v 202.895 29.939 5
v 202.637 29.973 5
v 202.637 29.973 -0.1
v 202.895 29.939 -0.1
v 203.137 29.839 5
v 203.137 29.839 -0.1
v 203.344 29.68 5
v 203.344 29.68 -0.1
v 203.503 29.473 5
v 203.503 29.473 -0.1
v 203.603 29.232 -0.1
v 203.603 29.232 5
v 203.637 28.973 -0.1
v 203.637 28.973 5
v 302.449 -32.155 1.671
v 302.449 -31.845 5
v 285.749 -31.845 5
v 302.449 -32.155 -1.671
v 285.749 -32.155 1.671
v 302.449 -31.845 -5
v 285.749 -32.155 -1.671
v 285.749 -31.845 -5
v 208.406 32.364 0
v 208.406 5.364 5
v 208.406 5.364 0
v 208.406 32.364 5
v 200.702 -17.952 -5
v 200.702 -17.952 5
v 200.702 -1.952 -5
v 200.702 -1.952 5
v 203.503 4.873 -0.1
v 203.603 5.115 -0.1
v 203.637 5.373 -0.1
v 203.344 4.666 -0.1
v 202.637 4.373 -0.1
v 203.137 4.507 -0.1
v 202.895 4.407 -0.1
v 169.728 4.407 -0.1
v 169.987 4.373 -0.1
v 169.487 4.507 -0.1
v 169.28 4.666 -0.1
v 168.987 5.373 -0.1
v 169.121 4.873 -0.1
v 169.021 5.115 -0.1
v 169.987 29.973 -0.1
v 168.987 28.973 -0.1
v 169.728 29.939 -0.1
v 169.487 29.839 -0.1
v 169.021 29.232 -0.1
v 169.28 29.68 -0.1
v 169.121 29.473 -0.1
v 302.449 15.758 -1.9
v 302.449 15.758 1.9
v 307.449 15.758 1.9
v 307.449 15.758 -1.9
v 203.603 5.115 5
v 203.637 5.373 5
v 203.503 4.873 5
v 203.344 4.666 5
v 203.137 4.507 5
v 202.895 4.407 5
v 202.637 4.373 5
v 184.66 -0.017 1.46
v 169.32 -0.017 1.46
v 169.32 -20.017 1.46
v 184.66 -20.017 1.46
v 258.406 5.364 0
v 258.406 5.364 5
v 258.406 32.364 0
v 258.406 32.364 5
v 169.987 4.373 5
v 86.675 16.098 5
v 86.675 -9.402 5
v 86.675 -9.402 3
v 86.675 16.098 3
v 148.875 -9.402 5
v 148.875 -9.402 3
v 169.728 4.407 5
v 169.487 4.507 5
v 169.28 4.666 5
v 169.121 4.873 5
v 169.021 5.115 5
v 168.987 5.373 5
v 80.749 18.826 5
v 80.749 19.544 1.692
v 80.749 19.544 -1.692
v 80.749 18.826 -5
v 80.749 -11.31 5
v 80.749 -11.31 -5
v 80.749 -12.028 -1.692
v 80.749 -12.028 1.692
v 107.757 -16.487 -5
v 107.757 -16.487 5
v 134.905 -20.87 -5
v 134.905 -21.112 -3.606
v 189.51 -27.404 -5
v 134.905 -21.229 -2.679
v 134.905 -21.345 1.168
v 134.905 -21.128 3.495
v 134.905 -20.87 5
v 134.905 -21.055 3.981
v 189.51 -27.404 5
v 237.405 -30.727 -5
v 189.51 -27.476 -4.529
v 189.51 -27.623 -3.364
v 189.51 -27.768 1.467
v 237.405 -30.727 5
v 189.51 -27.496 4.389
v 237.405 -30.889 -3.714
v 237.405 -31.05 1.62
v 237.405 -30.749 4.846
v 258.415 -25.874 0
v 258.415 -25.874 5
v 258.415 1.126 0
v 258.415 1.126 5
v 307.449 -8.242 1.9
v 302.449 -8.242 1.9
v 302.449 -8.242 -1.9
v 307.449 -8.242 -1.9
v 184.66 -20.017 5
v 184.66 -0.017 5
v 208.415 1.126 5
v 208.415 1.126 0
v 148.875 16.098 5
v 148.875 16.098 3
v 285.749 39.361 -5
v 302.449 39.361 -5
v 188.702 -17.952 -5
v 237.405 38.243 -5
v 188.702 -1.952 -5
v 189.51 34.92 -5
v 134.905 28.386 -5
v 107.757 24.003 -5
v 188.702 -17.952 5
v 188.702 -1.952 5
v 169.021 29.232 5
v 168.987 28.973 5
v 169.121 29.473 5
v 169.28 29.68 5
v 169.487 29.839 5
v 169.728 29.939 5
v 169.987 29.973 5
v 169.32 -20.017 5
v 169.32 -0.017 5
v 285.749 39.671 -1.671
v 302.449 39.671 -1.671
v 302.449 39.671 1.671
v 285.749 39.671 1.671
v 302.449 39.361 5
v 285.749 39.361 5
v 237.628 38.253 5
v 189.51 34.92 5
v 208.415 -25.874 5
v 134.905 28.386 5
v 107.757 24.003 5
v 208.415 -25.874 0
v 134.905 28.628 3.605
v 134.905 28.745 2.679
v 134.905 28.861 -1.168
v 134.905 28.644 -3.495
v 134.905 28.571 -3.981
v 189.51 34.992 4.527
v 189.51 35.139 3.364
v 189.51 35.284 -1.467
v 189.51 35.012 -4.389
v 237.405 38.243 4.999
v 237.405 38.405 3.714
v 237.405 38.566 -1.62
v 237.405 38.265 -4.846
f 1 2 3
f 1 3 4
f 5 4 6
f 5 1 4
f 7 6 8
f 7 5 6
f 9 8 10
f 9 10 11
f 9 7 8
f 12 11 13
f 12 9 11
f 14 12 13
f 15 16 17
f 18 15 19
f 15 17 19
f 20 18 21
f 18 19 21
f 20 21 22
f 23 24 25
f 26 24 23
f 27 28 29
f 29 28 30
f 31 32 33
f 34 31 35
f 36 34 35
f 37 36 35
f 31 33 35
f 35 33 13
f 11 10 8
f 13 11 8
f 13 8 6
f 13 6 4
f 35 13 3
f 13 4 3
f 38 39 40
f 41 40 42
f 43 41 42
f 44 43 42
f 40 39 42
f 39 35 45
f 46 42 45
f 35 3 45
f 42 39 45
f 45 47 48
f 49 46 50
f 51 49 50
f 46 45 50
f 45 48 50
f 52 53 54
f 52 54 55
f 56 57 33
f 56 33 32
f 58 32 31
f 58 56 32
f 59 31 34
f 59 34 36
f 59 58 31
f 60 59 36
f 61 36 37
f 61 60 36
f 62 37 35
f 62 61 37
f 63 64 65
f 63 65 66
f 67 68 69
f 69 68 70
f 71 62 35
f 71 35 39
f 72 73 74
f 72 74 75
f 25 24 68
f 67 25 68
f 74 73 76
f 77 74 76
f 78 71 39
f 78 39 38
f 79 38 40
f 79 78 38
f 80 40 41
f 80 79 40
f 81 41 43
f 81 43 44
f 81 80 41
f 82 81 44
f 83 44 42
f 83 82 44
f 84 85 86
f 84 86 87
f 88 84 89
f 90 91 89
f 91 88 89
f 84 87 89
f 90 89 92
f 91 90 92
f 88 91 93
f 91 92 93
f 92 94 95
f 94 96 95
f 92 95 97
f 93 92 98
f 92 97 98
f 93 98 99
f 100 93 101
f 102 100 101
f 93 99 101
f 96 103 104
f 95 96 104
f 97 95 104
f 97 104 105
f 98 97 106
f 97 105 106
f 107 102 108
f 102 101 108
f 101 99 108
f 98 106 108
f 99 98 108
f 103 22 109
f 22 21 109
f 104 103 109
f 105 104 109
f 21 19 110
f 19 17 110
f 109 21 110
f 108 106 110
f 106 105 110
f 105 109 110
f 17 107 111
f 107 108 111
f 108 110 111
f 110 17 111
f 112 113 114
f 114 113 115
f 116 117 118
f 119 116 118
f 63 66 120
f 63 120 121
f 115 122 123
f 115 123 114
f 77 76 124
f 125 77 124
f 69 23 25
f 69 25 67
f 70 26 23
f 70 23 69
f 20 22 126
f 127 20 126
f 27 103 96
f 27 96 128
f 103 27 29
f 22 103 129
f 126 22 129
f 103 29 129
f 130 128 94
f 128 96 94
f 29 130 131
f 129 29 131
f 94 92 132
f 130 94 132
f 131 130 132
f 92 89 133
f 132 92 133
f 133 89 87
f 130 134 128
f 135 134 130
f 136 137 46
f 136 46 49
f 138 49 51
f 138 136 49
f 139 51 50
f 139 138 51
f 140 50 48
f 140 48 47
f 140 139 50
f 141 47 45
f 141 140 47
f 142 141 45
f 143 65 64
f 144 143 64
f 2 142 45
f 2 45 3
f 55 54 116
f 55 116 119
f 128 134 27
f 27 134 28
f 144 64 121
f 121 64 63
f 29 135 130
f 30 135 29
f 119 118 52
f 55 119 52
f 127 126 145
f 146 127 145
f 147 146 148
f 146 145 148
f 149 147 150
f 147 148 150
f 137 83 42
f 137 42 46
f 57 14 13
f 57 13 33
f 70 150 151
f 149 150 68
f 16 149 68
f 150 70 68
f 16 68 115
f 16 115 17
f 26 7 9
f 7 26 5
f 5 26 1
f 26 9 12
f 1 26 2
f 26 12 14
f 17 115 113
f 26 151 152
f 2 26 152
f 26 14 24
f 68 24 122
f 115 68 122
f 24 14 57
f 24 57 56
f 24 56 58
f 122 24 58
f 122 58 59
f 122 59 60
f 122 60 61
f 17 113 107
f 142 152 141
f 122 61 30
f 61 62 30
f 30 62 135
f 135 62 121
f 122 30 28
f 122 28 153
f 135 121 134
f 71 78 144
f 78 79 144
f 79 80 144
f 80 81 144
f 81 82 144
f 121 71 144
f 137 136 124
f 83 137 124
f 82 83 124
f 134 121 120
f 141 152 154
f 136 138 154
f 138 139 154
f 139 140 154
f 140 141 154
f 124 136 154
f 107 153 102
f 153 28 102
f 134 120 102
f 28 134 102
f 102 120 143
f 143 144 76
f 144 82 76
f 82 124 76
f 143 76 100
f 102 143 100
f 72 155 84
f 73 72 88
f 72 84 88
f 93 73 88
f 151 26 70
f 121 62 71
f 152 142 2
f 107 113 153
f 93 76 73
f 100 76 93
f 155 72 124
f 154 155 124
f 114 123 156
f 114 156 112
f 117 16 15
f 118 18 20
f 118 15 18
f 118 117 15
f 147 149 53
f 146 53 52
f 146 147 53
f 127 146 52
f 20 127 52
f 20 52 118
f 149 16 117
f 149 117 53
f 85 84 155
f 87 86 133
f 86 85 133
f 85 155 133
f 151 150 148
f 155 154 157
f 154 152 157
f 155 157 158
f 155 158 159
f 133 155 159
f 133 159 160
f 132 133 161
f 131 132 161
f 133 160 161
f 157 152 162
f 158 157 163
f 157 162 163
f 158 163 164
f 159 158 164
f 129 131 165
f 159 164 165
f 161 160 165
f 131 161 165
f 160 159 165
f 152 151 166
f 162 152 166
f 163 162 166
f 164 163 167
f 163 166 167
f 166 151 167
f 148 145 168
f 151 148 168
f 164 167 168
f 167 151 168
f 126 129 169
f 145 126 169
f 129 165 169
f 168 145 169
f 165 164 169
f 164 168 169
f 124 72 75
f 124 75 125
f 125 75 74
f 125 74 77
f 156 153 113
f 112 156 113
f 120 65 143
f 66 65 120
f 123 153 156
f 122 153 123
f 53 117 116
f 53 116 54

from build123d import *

# Parameters (mm, degrees)
CUT_EXTRUDE1_DEPTH   = 212.88306668
BOSS_EXTRUDE2_DEPTH  = 139.7
SKETCH9_R            = 35.95202499
BOSS_EXTRUDE3_DEPTH  = 4
CUT_EXTRUDE2_DEPTH   = 4
SKETCH11_W           = 10
SKETCH11_H           = 34
CUT_EXTRUDE3_DEPTH   = 15
RASPBERRY_PI_5_DEPTH = 5
GPS_SLOT_DEPTH       = 5.1
SKETCH14_W           = 12
SKETCH14_H           = 16
MPU_DEPTH            = 434.220724454
ALTIMETER_DEPTH      = 434.220724454
ALTIMETER_DEPTH_BACK = 3.54
SKETCH15_W           = 15.34
SKETCH15_H           = 20
SKETCH16_W           = 62.2
SKETCH16_H           = 25.5
PCA9685_DEPTH        = 2
SKETCH17_W           = 50
SKETCH17_H           = 27
ESP_32_1_DEPTH       = 5
SKETCH18_W           = 55
SKETCH18_H           = 30.1
BATTERY_1_DEPTH      = 3.5
SKETCH21_W           = 55
SKETCH21_H           = 30.1
BATTERY_2_DEPTH      = 3.5
SKETCH25_W           = 21.1
SKETCH25_H           = 43.1
STEP_DOWN_DEPTH      = 1
BOSS_EXTRUDE4_START  = -120
SKETCH27_R           = 36.3
SKETCH27_R_2         = 30
BOSS_EXTRUDE4_DEPTH  = 7
CUT_EXTRUDE4_START   = -127
SKETCH28_R           = 36.3
CUT_EXTRUDE4_DEPTH   = 480.865446219
SKETCH29_W           = 3.8
SKETCH29_H           = 24
BOSS_EXTRUDE5_DEPTH  = 5
SKETCH33_W           = 50
SKETCH33_H           = 27
ESP_32_2_DEPTH       = 5


with BuildPart() as part:
    # Sketch3 → Revolve1 (revolve)
    with BuildSketch(Plane.XY):
        with BuildLine():
            Line((285.74876522, 39.710021262), (285.74876522, 3.757996272))
            Line((285.74876522, 3.757996272), (80.74876522, 3.757996272))
            Line((80.74876522, 3.757996272), (80.74876522, 19.634316044))
            add(Edge.make_bspline(
                [(80.74876522, 19.634316044), (82.347112552, 19.950400666), (85.636412123, 20.593859316), (92.311794173, 21.870421625), (109.164486257, 24.943674568), (127.867996046, 27.977765645), (146.633052135, 30.604670801), (163.733801994, 32.658467989), (174.004488004, 33.801497199), (184.284802392, 34.855212792), (194.57611333, 35.797171826), (204.876878825, 36.627240946), (213.466527777, 37.244314669), (220.34120026, 37.693162367), (227.218898943, 38.097179671), (233.238636081, 38.411453209), (238.400481516, 38.652791264), (242.701722554, 38.8352093), (246.145182192, 38.969923968), (249.584994627, 39.093417446), (253.03241088, 39.20568842), (256.467961578, 39.306735697), (259.924132141, 39.396558203), (263.346991762, 39.475154984), (266.82565511, 39.542525204), (270.211898057, 39.598668148), (273.756466178, 39.643583219), (276.60509147, 39.673059099), (279.43950326, 39.691306197), (281.597603414, 39.703938851), (283.942998009, 39.708617629), (285.03032454, 39.710021262), (285.74876522, 39.710021262)],
                knots=[0.322773044, 0.322773044, 0.322773044, 0.322773044, 0.322773044, 0.341563488, 0.3614269, 0.401153715, 0.520334158, 0.56006097, 0.579924379, 0.599787787, 0.639514601, 0.679241414, 0.699104823, 0.718968231, 0.738831638, 0.758695045, 0.778558452, 0.788490156, 0.798421859, 0.808353563, 0.818285267, 0.828216971, 0.838148675, 0.848080378, 0.858012082, 0.867943786, 0.87787549, 0.887807193, 0.897738897, 0.902704749, 0.9076706, 0.917602304, 0.917602304, 0.917602304, 0.917602304, 0.917602304], degree=4))
        make_face()
    revolve(axis=Axis((285.74876522, 3.757996272, 0), (-1, 0, 0)))

    # Sketch6 → Cut-Extrude1 (cut, through all)
    with BuildSketch(Plane(origin=(285.74876522, 0, 0), x_dir=(0, 0, -1), z_dir=(1, 0, 0))):
        with BuildLine():
            Line((-5, -31.844645496), (-5, 39.36063804))
            ThreePointArc((-5, 39.360638041), (-35.95202499, 3.757996272), (-5, -31.844645496))
        make_face()
        with BuildLine():
            ThreePointArc((35.95202499, 3.757996272), (27.132160123, 27.346001444), (5, 39.36063804))
            Line((5, 39.36063804), (5, -31.844645496))
            ThreePointArc((5, -31.844645496), (27.132160123, -19.830008899), (35.95202499, 3.757996272))
        make_face()
    extrude(amount=-CUT_EXTRUDE1_DEPTH, mode=Mode.SUBTRACT)

    # Sketch8 → Boss-Extrude2 (add)
    with BuildSketch(Plane(origin=(285.74876522, 0, 0), x_dir=(0, 0, -1), z_dir=(1, 0, 0))):
        with BuildLine():
            Line((5, -31.844645496), (5, 39.360638041))
            ThreePointArc((5, 39.360638041), (0, 39.710021262), (-5, 39.360638041))
            Line((-5, 39.360638041), (-5, -31.844645496))
            ThreePointArc((-5, -31.844645496), (0, -32.194028718), (5, -31.844645496))
        make_face()
    extrude(amount=BOSS_EXTRUDE2_DEPTH)

    # Sketch9 → Boss-Extrude3 (add)
    with BuildSketch(Plane(origin=(425.44876522, 0, 0), x_dir=(0, 0, -1), z_dir=(1, 0, 0))):
        with Locations(Location((0, 3.757996272, 0), (0, 0, 262.00572083))):
            Circle(SKETCH9_R)
    extrude(amount=BOSS_EXTRUDE3_DEPTH)

    # Sketch10 → Cut-Extrude2 (cut)
    with BuildSketch(Plane(origin=(429.44876522, 0, 0), x_dir=(0, 0, -1), z_dir=(1, 0, 0))):
        Polygon((-17, -4.442003728), (-17, 11.957996272), (-8.2, 20.757996272), (8.2, 20.757996272), (17, 11.957996272), (17, -4.442003728), (8.2, -13.242003728), (-8.2, -13.242003728), align=None)
    extrude(amount=-CUT_EXTRUDE2_DEPTH, mode=Mode.SUBTRACT)

    # Sketch11 → Cut-Extrude3 (cut)
    with BuildSketch(Plane(origin=(425.44876522, 0, 0), x_dir=(0, 0, -1), z_dir=(1, 0, 0))):
        with Locations((0, 3.757996272)):
            Rectangle(SKETCH11_W, SKETCH11_H)
    extrude(amount=-CUT_EXTRUDE3_DEPTH, mode=Mode.SUBTRACT)

    # Sketch12 → Raspberry Pi 5 (cut)
    with BuildSketch(Plane.XY.offset(5)):
        with BuildLine():
            Line((404.44876522, -22.611276601), (321.44876522, -22.611276601))
            ThreePointArc((321.44876522, -22.611276601), (320.741658439, -22.318383382), (320.44876522, -21.611276601))
            Line((320.44876522, -21.611276601), (320.44876522, 32.388723399))
            ThreePointArc((320.44876522, 32.388723399), (320.741658439, 33.09583018), (321.44876522, 33.388723399))
            Line((321.44876522, 33.388723399), (404.44876522, 33.388723399))
            ThreePointArc((404.44876522, 33.388723399), (405.155872001, 33.09583018), (405.44876522, 32.388723399))
            Line((405.44876522, 32.388723399), (405.44876522, -21.611276601))
            ThreePointArc((405.44876522, -21.611276601), (405.155872001, -22.318383382), (404.44876522, -22.611276601))
        make_face()
    extrude(amount=-RASPBERRY_PI_5_DEPTH, mode=Mode.SUBTRACT)

    # Sketch13 → GPS Slot (cut)
    with BuildSketch(Plane.XY.offset(5)):
        with BuildLine():
            Line((202.636622216, 4.373367791), (169.986622216, 4.373367791))
            ThreePointArc((169.986622216, 4.373367791), (169.279515435, 4.666261009), (168.986622216, 5.373367791))
            Line((168.986622216, 5.373367791), (168.986622216, 28.973367791))
            ThreePointArc((168.986622216, 28.973367791), (169.279515435, 29.680474572), (169.986622216, 29.973367791))
            Line((169.986622216, 29.973367791), (202.636622216, 29.973367791))
            ThreePointArc((202.636622216, 29.973367791), (203.343728997, 29.680474572), (203.636622216, 28.973367791))
            Line((203.636622216, 28.973367791), (203.636622216, 5.373367791))
            ThreePointArc((203.636622216, 5.373367791), (203.343728997, 4.666261009), (202.636622216, 4.373367791))
        make_face()
    extrude(amount=-GPS_SLOT_DEPTH, mode=Mode.SUBTRACT)

    # Sketch14 → MPU (cut, through all)
    with BuildSketch(Plane.XY.offset(5)):
        with Locations((194.701703522, -9.951938862)):
            Rectangle(SKETCH14_W, SKETCH14_H)
    extrude(amount=-MPU_DEPTH, mode=Mode.SUBTRACT)

    # Sketch15 → Altimeter (cut, two sides: drawn at the far end of the back side and taken through both)
    with BuildSketch(Plane.XY.offset(5).offset(-ALTIMETER_DEPTH_BACK)):
        with Locations((176.990311954, -10.017213078)):
            Rectangle(SKETCH15_W, SKETCH15_H)
    extrude(amount=ALTIMETER_DEPTH + ALTIMETER_DEPTH_BACK, mode=Mode.SUBTRACT)

    # Sketch16 → PCA9685 (cut)
    with BuildSketch(Plane.XY.offset(5)):
        with Locations((117.775147159, 3.348372785)):
            Rectangle(SKETCH16_W, SKETCH16_H)
    extrude(amount=-PCA9685_DEPTH, mode=Mode.SUBTRACT)

    # Sketch17 → ESP-32 (1) (cut)
    with BuildSketch(Plane.XY.offset(5)):
        with Locations((233.414755785, -12.374476934)):
            Rectangle(SKETCH17_W, SKETCH17_H)
    extrude(amount=-ESP_32_1_DEPTH, mode=Mode.SUBTRACT)

    # Sketch18 → Battery 1 (cut)
    with BuildSketch(Plane(origin=(0, 0, -5), x_dir=(-1, 0, 0), z_dir=(0, 0, -1))):
        with Locations((-377.94876522, 19.967269146)):
            Rectangle(SKETCH18_W, SKETCH18_H)
    extrude(amount=-BATTERY_1_DEPTH, mode=Mode.SUBTRACT)

    # Sketch21 → Battery 2 (cut)
    with BuildSketch(Plane(origin=(0, 0, -5), x_dir=(-1, 0, 0), z_dir=(0, 0, -1))):
        with Locations((-377.94876522, -12.451276601)):
            Rectangle(SKETCH21_W, SKETCH21_H)
    extrude(amount=-BATTERY_2_DEPTH, mode=Mode.SUBTRACT)

    # Sketch25 → Step Down (cut)
    with BuildSketch(Plane(origin=(0, 0, -5), x_dir=(-1, 0, 0), z_dir=(0, 0, -1))):
        with Locations((-323.977591294, 5.876880331)):
            Rectangle(SKETCH25_W, SKETCH25_H)
    extrude(amount=-STEP_DOWN_DEPTH, mode=Mode.SUBTRACT)

    # Sketch27 → Boss-Extrude4 (add)
    with BuildSketch(Plane(origin=(429.44876522, 0, 0), x_dir=(0, 0, -1), z_dir=(1, 0, 0)).offset(BOSS_EXTRUDE4_START)):
        with Locations((0, 3.757996272)):
            Circle(SKETCH27_R)
        with Locations((0, 3.757996272)):
            Circle(SKETCH27_R_2, mode=Mode.SUBTRACT)
    extrude(amount=-BOSS_EXTRUDE4_DEPTH)

    # Sketch28 → Cut-Extrude4 (cut, through all)
    with BuildSketch(Plane(origin=(429.44876522, 0, 0), x_dir=(0, 0, -1), z_dir=(1, 0, 0)).offset(CUT_EXTRUDE4_START)):
        with Locations((0, 3.757996272)):
            Circle(SKETCH28_R)
    extrude(amount=CUT_EXTRUDE4_DEPTH, mode=Mode.SUBTRACT)

    # Sketch29 → Boss-Extrude5 (add)
    with BuildSketch(Plane(origin=(302.44876522, 0, 0), x_dir=(0, 0, -1), z_dir=(1, 0, 0))):
        with Locations((0, 3.757996272)):
            Rectangle(SKETCH29_W, SKETCH29_H)
    extrude(amount=BOSS_EXTRUDE5_DEPTH)

    # Sketch33 → ESP-32 (2) (cut)
    with BuildSketch(Plane.XY.offset(5)):
        with Locations((233.406186828, 18.864282523)):
            Rectangle(SKETCH33_W, SKETCH33_H)
    extrude(amount=-ESP_32_2_DEPTH, mode=Mode.SUBTRACT)


solid = part.part
